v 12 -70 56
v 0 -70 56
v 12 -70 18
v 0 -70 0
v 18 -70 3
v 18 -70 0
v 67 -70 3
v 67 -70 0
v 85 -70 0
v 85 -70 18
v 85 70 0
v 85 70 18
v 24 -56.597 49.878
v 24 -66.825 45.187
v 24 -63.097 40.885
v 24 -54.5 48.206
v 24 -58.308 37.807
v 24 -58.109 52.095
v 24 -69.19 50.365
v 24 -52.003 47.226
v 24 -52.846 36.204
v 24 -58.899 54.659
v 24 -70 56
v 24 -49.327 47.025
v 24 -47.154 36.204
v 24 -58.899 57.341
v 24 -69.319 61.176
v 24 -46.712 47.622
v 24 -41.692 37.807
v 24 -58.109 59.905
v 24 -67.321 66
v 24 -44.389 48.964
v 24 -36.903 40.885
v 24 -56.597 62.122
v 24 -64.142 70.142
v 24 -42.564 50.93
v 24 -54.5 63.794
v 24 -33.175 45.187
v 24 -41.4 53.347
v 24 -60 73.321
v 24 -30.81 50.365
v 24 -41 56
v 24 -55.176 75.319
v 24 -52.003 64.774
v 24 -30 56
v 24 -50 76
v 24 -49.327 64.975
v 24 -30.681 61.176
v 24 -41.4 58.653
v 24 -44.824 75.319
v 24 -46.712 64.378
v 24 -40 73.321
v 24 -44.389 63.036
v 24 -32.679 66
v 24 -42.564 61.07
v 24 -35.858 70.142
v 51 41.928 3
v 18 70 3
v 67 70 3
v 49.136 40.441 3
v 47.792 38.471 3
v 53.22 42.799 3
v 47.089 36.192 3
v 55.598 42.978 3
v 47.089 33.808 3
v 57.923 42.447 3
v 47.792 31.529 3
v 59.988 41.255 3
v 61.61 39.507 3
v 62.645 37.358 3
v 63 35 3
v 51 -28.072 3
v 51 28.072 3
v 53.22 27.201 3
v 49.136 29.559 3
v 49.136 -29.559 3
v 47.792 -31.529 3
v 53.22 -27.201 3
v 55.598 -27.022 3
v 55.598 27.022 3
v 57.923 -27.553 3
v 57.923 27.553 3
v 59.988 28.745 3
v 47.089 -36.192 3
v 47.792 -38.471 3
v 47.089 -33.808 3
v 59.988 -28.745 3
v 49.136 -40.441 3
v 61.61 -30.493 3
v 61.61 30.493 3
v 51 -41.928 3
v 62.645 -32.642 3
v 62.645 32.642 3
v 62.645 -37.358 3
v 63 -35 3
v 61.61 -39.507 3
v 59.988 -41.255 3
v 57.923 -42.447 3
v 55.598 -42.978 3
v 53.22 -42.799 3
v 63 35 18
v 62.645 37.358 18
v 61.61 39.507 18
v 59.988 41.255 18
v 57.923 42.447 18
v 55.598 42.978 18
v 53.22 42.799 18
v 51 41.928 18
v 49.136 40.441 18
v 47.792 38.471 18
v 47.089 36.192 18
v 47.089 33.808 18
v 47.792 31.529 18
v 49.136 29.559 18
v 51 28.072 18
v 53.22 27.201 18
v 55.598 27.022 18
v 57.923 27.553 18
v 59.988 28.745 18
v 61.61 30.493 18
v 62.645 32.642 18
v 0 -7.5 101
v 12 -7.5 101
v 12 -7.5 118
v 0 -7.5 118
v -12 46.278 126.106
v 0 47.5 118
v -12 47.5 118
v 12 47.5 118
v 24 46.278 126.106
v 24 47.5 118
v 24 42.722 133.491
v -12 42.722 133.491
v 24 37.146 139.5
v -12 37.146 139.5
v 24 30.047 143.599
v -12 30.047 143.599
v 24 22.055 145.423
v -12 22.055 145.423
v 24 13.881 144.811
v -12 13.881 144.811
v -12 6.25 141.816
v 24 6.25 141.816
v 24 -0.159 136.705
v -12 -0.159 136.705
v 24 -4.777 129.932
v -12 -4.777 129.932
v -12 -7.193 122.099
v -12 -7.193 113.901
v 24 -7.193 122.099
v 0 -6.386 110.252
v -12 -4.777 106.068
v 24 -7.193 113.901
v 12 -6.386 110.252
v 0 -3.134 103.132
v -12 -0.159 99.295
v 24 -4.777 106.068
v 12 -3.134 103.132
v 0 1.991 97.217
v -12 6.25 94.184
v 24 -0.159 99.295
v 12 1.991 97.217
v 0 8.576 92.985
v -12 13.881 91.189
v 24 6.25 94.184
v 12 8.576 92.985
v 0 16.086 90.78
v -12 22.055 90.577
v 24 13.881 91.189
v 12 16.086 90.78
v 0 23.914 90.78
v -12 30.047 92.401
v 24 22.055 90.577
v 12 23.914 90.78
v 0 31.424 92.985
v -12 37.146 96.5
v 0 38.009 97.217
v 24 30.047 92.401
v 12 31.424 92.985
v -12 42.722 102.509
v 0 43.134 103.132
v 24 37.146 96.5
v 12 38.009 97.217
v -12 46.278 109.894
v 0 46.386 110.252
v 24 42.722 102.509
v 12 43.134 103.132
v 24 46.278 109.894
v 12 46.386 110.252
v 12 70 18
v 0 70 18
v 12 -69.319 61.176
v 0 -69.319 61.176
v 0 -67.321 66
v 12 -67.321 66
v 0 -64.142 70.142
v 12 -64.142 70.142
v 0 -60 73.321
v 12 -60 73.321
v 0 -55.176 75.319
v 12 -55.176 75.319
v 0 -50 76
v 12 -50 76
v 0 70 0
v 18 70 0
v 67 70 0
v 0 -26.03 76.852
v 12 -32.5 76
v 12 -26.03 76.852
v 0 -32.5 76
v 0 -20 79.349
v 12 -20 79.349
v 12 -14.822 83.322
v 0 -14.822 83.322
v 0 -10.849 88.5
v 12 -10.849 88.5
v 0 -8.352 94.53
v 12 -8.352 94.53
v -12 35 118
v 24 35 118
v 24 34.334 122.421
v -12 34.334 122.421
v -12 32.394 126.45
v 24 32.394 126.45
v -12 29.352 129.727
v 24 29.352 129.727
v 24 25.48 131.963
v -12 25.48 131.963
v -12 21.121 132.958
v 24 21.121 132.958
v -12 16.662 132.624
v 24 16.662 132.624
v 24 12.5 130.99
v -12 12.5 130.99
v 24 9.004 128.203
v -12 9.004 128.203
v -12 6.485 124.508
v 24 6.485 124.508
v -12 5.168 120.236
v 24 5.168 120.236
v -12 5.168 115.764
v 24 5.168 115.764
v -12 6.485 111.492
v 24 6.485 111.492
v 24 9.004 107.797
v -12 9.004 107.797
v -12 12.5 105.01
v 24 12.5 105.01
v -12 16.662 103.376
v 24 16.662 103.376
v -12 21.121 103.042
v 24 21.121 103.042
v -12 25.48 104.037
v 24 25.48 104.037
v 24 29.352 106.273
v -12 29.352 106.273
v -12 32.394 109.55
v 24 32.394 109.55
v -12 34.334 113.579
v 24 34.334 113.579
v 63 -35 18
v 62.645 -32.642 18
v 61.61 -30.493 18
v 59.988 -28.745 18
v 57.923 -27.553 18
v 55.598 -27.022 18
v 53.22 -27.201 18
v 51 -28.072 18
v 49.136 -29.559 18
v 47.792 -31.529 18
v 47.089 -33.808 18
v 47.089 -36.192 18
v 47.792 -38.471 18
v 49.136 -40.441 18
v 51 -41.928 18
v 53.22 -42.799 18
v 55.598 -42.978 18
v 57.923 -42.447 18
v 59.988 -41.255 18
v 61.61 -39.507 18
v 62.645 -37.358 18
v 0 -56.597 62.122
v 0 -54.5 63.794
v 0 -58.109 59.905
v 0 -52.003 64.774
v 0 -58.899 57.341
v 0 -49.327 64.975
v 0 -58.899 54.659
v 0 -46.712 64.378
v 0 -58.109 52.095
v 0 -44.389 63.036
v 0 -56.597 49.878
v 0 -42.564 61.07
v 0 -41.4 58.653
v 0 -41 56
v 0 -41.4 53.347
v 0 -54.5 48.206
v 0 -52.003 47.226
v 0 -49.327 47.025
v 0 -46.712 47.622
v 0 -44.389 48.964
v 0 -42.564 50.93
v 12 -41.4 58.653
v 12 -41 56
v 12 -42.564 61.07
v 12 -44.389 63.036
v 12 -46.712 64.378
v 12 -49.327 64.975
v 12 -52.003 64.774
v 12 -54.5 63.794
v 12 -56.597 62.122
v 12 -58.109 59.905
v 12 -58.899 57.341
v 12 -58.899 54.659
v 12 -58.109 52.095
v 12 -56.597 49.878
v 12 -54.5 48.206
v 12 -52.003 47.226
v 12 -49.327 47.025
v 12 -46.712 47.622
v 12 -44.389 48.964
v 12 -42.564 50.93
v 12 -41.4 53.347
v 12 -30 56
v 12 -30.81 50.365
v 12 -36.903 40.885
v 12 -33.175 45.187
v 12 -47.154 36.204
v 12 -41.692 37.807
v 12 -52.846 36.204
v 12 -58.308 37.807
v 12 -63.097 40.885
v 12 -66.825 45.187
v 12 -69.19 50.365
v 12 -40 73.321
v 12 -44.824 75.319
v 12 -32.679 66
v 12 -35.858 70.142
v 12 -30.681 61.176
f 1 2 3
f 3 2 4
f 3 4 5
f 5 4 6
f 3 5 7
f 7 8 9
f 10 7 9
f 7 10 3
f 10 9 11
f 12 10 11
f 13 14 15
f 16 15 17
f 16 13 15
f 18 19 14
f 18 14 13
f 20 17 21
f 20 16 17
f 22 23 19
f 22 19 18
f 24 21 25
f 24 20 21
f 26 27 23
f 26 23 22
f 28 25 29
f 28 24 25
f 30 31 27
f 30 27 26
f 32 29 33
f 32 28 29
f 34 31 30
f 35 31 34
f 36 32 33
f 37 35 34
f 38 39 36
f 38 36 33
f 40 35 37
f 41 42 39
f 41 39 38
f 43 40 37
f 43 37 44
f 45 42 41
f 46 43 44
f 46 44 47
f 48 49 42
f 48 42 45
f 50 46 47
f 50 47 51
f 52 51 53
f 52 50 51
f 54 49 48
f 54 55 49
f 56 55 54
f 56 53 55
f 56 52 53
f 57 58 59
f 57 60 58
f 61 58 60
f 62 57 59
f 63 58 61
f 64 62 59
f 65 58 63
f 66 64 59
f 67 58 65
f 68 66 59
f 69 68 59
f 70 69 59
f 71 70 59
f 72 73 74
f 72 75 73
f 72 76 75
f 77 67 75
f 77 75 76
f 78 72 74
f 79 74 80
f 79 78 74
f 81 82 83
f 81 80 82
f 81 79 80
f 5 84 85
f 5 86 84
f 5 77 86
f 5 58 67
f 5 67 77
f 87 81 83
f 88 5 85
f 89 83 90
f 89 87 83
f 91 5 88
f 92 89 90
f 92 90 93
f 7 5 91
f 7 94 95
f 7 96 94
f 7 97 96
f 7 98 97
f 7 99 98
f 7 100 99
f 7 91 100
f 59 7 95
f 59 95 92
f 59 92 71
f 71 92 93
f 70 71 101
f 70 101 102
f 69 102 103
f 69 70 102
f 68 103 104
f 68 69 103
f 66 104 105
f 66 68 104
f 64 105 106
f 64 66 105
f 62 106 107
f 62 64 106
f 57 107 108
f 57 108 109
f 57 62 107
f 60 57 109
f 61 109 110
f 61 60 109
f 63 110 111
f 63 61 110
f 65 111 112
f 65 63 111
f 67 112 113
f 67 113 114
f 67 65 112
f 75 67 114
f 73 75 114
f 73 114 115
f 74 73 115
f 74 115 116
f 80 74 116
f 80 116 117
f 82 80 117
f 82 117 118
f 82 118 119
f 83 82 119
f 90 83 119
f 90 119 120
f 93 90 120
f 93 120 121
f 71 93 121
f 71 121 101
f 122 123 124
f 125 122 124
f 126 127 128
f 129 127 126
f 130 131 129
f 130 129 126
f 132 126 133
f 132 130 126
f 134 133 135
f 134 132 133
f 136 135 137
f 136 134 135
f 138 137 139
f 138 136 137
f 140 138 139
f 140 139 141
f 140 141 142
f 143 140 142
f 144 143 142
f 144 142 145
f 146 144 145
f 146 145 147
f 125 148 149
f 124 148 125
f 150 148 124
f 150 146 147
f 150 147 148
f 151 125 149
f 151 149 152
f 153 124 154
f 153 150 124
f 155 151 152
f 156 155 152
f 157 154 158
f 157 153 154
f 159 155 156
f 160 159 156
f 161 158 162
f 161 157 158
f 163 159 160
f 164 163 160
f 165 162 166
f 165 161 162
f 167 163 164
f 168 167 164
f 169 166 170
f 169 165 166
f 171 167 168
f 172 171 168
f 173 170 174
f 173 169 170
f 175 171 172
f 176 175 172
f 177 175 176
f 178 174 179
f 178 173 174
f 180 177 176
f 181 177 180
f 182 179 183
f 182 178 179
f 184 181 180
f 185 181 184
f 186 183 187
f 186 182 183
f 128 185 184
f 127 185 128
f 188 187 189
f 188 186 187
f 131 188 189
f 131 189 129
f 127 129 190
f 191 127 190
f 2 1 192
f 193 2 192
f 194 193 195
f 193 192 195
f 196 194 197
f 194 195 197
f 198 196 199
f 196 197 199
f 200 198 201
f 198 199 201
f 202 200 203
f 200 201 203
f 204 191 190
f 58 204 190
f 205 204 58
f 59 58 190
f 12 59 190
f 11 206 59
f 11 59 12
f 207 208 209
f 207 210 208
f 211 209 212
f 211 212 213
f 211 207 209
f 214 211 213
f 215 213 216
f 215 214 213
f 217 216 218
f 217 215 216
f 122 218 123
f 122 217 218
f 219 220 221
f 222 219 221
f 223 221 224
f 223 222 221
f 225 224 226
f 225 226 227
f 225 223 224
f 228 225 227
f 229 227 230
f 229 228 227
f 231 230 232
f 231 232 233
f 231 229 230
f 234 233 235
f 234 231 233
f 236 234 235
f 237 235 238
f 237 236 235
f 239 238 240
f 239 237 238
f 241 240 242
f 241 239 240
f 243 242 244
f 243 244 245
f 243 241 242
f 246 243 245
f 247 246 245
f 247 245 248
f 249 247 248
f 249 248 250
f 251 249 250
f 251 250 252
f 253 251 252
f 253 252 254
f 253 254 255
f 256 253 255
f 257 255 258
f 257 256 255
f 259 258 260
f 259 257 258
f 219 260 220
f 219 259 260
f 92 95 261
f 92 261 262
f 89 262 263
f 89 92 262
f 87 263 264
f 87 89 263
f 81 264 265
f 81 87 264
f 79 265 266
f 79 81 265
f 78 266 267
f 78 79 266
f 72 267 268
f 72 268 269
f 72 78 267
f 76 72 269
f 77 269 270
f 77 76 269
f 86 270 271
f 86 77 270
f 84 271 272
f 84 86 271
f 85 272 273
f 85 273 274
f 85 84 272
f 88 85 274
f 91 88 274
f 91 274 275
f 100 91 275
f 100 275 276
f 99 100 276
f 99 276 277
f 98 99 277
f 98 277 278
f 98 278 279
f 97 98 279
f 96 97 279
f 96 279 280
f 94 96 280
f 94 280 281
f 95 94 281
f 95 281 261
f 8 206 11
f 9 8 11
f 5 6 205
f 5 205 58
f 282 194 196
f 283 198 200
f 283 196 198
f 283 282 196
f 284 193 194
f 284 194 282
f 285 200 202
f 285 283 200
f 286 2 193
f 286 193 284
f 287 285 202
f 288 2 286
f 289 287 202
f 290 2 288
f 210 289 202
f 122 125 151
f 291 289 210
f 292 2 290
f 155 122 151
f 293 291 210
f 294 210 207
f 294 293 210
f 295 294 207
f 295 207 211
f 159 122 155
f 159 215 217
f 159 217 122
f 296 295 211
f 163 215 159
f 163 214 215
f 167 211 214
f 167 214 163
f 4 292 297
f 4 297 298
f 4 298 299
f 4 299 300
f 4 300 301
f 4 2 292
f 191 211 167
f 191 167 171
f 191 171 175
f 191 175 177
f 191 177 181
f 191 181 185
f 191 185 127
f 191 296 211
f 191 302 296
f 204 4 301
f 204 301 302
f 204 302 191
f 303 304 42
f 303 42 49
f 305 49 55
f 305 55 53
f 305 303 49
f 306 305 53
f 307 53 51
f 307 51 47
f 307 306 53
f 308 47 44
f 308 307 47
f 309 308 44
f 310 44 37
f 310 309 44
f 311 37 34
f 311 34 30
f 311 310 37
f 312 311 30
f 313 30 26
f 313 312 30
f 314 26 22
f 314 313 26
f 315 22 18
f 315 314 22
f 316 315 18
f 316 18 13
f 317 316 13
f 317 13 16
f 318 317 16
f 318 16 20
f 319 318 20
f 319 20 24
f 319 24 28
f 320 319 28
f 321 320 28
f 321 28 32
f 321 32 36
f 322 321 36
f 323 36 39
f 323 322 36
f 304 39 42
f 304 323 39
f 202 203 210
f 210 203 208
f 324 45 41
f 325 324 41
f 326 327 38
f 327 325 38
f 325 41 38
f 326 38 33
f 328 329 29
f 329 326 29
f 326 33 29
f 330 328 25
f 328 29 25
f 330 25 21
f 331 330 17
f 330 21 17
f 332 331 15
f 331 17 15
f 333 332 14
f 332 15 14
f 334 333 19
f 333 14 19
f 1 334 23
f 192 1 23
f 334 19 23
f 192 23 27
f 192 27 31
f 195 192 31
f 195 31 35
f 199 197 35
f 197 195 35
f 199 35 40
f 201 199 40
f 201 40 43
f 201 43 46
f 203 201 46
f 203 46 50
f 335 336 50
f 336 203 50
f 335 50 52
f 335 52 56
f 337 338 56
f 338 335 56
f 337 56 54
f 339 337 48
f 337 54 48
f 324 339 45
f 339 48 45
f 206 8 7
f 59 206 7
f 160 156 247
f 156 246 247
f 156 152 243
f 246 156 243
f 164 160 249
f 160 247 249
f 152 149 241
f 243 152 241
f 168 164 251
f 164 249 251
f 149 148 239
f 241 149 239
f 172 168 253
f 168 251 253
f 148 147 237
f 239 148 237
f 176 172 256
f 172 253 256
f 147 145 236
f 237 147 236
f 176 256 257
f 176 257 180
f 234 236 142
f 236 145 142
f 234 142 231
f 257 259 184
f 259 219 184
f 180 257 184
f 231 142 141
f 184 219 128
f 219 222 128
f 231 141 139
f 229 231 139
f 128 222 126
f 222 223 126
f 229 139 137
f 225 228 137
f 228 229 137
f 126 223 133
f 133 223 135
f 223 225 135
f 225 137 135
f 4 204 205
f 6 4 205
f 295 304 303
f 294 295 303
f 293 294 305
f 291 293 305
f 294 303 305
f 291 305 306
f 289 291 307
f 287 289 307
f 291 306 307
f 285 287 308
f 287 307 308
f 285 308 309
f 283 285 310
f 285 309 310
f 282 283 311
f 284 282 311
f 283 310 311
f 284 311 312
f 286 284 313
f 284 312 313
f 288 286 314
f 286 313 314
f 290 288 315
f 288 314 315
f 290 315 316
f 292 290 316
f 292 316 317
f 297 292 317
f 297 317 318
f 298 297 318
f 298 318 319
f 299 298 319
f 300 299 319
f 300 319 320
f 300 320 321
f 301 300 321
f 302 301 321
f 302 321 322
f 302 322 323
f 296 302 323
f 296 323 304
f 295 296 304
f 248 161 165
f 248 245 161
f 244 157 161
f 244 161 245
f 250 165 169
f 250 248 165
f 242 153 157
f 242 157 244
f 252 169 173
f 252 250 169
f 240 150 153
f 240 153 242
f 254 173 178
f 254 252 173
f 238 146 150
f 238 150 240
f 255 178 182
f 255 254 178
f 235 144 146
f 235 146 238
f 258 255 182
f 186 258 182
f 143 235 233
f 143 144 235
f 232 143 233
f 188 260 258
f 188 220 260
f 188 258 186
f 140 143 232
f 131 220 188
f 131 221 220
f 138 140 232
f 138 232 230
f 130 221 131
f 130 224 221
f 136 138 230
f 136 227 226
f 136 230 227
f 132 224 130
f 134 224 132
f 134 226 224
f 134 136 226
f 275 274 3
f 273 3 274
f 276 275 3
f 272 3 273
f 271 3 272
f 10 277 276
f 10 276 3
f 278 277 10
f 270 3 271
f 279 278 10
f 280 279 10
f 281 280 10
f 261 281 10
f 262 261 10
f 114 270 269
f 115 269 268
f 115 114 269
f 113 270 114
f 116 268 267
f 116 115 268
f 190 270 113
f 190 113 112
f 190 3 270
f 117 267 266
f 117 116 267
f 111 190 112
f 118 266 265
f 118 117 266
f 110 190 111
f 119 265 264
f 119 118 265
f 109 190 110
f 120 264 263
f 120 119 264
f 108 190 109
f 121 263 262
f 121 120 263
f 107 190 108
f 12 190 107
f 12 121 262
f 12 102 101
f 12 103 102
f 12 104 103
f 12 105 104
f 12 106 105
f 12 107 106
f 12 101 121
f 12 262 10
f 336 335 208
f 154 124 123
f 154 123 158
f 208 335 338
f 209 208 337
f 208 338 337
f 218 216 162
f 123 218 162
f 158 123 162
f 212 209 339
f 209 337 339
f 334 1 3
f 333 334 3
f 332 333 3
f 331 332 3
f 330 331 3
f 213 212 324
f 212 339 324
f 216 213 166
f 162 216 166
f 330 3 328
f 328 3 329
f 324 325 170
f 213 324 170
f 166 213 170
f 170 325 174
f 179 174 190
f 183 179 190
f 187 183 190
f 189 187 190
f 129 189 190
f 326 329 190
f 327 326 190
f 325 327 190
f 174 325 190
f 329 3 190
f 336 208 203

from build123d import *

# Parameters (mm, degrees)
F0_W      = 85
F0_H      = 140
F0_R      = 8
F1_DEPTH  = 18
F2_W      = 49
F2_H      = 3
F3_DEPTH  = 140.001
F4_W      = 12
F4_H      = 140
F5_DEPTH  = 100
F6_R      = 9
F7_DEPTH  = 12
F9_R      = 27.5
F9_R_2    = 15
F10_DEPTH = 18
F11_DEPTH = 25
F12_DEPTH = 25
F13_R     = 25
F14_DEPTH = 25


with BuildPart() as f1:
    # F0 (on Top) → F1 (new body)
    with BuildSketch(Plane.XY):
        with Locations((42.5, 0)):
            Rectangle(F0_W, F0_H)
        with Locations((55, -35)):
            Circle(F0_R, mode=Mode.SUBTRACT)
        with Locations((55, 35)):
            Circle(F0_R, mode=Mode.SUBTRACT)
    extrude(amount=F1_DEPTH)

    # F2 (on face) → F3 (cut, through all)
    with BuildSketch(Plane.XZ.offset(70)):
        with Locations((42.5, 1.5)):
            Rectangle(F2_W, F2_H)
    extrude(amount=-F3_DEPTH, mode=Mode.SUBTRACT)

    # F4 (on face) → F5 (join)
    with BuildSketch(Plane.XY.offset(18)):
        with Locations((6, 0)):
            Rectangle(F4_W, F4_H)
    extrude(amount=F5_DEPTH)

    # F6 (on face) → F7 (join)
    with BuildSketch(Plane.YZ.offset(12)):
        with BuildLine():
            ThreePointArc((-30, 56), (-35.8578643763, 70.1421356237), (-50, 76))
            ThreePointArc((-50, 76), (-64.1421356237, 70.1421356237), (-70, 56))
            ThreePointArc((-70, 56), (-50, 36), (-30, 56))
        make_face()
        with Locations((-50, 56)):
            Circle(F6_R, mode=Mode.SUBTRACT)
    extrude(amount=F7_DEPTH)

    # F9 (on offset) → F10 (join, symmetric)
    with BuildSketch(Plane.YZ.offset(6)):
        with Locations((20, 118)):
            Circle(F9_R)
        with Locations((20, 118)):
            Circle(F9_R_2, mode=Mode.SUBTRACT)
    extrude(amount=F10_DEPTH, both=True)

    # F6 (on face) → F11 (cut)
    with BuildSketch(Plane.YZ.offset(12)):
        with Locations((-50, 56)):
            Circle(F6_R)
        with BuildLine():
            ThreePointArc((5, 118), (20, 103), (35, 118))
            Line((35, 118), (20, 118))
            Line((20, 118), (5, 118))
        make_face()
    extrude(amount=-F11_DEPTH, mode=Mode.SUBTRACT)

    # F6 (on face) → F12 (cut)
    with BuildSketch(Plane.YZ.offset(12)):
        with BuildLine():
            Line((-7.5, 76), (-7.5, 118))
            Line((-7.5, 118), (-70, 118))
            Line((-70, 118), (-70, 56))
            ThreePointArc((-70, 56), (-64.1421356237, 70.1421356237), (-50, 76))
            Line((-50, 76), (-7.5, 76))
        make_face()
        Polygon((70, 118), (47.5, 118), (70, 18), align=None)
    extrude(amount=-F12_DEPTH, mode=Mode.SUBTRACT)

    # F13
    f13_edges = [f1.edges().sort_by_distance(p)[0] for p in [
        (6, -7.5, 76),
    ]]
    fillet(f13_edges, radius=F13_R)

    # F0 (on Top) → F14 (cut)
    with BuildSketch(Plane.XY):
        with Locations((55, -35)):
            Circle(F0_R)
        with Locations((55, 35)):
            Circle(F0_R)
    extrude(amount=-F14_DEPTH, mode=Mode.SUBTRACT)


solid = f1.part
